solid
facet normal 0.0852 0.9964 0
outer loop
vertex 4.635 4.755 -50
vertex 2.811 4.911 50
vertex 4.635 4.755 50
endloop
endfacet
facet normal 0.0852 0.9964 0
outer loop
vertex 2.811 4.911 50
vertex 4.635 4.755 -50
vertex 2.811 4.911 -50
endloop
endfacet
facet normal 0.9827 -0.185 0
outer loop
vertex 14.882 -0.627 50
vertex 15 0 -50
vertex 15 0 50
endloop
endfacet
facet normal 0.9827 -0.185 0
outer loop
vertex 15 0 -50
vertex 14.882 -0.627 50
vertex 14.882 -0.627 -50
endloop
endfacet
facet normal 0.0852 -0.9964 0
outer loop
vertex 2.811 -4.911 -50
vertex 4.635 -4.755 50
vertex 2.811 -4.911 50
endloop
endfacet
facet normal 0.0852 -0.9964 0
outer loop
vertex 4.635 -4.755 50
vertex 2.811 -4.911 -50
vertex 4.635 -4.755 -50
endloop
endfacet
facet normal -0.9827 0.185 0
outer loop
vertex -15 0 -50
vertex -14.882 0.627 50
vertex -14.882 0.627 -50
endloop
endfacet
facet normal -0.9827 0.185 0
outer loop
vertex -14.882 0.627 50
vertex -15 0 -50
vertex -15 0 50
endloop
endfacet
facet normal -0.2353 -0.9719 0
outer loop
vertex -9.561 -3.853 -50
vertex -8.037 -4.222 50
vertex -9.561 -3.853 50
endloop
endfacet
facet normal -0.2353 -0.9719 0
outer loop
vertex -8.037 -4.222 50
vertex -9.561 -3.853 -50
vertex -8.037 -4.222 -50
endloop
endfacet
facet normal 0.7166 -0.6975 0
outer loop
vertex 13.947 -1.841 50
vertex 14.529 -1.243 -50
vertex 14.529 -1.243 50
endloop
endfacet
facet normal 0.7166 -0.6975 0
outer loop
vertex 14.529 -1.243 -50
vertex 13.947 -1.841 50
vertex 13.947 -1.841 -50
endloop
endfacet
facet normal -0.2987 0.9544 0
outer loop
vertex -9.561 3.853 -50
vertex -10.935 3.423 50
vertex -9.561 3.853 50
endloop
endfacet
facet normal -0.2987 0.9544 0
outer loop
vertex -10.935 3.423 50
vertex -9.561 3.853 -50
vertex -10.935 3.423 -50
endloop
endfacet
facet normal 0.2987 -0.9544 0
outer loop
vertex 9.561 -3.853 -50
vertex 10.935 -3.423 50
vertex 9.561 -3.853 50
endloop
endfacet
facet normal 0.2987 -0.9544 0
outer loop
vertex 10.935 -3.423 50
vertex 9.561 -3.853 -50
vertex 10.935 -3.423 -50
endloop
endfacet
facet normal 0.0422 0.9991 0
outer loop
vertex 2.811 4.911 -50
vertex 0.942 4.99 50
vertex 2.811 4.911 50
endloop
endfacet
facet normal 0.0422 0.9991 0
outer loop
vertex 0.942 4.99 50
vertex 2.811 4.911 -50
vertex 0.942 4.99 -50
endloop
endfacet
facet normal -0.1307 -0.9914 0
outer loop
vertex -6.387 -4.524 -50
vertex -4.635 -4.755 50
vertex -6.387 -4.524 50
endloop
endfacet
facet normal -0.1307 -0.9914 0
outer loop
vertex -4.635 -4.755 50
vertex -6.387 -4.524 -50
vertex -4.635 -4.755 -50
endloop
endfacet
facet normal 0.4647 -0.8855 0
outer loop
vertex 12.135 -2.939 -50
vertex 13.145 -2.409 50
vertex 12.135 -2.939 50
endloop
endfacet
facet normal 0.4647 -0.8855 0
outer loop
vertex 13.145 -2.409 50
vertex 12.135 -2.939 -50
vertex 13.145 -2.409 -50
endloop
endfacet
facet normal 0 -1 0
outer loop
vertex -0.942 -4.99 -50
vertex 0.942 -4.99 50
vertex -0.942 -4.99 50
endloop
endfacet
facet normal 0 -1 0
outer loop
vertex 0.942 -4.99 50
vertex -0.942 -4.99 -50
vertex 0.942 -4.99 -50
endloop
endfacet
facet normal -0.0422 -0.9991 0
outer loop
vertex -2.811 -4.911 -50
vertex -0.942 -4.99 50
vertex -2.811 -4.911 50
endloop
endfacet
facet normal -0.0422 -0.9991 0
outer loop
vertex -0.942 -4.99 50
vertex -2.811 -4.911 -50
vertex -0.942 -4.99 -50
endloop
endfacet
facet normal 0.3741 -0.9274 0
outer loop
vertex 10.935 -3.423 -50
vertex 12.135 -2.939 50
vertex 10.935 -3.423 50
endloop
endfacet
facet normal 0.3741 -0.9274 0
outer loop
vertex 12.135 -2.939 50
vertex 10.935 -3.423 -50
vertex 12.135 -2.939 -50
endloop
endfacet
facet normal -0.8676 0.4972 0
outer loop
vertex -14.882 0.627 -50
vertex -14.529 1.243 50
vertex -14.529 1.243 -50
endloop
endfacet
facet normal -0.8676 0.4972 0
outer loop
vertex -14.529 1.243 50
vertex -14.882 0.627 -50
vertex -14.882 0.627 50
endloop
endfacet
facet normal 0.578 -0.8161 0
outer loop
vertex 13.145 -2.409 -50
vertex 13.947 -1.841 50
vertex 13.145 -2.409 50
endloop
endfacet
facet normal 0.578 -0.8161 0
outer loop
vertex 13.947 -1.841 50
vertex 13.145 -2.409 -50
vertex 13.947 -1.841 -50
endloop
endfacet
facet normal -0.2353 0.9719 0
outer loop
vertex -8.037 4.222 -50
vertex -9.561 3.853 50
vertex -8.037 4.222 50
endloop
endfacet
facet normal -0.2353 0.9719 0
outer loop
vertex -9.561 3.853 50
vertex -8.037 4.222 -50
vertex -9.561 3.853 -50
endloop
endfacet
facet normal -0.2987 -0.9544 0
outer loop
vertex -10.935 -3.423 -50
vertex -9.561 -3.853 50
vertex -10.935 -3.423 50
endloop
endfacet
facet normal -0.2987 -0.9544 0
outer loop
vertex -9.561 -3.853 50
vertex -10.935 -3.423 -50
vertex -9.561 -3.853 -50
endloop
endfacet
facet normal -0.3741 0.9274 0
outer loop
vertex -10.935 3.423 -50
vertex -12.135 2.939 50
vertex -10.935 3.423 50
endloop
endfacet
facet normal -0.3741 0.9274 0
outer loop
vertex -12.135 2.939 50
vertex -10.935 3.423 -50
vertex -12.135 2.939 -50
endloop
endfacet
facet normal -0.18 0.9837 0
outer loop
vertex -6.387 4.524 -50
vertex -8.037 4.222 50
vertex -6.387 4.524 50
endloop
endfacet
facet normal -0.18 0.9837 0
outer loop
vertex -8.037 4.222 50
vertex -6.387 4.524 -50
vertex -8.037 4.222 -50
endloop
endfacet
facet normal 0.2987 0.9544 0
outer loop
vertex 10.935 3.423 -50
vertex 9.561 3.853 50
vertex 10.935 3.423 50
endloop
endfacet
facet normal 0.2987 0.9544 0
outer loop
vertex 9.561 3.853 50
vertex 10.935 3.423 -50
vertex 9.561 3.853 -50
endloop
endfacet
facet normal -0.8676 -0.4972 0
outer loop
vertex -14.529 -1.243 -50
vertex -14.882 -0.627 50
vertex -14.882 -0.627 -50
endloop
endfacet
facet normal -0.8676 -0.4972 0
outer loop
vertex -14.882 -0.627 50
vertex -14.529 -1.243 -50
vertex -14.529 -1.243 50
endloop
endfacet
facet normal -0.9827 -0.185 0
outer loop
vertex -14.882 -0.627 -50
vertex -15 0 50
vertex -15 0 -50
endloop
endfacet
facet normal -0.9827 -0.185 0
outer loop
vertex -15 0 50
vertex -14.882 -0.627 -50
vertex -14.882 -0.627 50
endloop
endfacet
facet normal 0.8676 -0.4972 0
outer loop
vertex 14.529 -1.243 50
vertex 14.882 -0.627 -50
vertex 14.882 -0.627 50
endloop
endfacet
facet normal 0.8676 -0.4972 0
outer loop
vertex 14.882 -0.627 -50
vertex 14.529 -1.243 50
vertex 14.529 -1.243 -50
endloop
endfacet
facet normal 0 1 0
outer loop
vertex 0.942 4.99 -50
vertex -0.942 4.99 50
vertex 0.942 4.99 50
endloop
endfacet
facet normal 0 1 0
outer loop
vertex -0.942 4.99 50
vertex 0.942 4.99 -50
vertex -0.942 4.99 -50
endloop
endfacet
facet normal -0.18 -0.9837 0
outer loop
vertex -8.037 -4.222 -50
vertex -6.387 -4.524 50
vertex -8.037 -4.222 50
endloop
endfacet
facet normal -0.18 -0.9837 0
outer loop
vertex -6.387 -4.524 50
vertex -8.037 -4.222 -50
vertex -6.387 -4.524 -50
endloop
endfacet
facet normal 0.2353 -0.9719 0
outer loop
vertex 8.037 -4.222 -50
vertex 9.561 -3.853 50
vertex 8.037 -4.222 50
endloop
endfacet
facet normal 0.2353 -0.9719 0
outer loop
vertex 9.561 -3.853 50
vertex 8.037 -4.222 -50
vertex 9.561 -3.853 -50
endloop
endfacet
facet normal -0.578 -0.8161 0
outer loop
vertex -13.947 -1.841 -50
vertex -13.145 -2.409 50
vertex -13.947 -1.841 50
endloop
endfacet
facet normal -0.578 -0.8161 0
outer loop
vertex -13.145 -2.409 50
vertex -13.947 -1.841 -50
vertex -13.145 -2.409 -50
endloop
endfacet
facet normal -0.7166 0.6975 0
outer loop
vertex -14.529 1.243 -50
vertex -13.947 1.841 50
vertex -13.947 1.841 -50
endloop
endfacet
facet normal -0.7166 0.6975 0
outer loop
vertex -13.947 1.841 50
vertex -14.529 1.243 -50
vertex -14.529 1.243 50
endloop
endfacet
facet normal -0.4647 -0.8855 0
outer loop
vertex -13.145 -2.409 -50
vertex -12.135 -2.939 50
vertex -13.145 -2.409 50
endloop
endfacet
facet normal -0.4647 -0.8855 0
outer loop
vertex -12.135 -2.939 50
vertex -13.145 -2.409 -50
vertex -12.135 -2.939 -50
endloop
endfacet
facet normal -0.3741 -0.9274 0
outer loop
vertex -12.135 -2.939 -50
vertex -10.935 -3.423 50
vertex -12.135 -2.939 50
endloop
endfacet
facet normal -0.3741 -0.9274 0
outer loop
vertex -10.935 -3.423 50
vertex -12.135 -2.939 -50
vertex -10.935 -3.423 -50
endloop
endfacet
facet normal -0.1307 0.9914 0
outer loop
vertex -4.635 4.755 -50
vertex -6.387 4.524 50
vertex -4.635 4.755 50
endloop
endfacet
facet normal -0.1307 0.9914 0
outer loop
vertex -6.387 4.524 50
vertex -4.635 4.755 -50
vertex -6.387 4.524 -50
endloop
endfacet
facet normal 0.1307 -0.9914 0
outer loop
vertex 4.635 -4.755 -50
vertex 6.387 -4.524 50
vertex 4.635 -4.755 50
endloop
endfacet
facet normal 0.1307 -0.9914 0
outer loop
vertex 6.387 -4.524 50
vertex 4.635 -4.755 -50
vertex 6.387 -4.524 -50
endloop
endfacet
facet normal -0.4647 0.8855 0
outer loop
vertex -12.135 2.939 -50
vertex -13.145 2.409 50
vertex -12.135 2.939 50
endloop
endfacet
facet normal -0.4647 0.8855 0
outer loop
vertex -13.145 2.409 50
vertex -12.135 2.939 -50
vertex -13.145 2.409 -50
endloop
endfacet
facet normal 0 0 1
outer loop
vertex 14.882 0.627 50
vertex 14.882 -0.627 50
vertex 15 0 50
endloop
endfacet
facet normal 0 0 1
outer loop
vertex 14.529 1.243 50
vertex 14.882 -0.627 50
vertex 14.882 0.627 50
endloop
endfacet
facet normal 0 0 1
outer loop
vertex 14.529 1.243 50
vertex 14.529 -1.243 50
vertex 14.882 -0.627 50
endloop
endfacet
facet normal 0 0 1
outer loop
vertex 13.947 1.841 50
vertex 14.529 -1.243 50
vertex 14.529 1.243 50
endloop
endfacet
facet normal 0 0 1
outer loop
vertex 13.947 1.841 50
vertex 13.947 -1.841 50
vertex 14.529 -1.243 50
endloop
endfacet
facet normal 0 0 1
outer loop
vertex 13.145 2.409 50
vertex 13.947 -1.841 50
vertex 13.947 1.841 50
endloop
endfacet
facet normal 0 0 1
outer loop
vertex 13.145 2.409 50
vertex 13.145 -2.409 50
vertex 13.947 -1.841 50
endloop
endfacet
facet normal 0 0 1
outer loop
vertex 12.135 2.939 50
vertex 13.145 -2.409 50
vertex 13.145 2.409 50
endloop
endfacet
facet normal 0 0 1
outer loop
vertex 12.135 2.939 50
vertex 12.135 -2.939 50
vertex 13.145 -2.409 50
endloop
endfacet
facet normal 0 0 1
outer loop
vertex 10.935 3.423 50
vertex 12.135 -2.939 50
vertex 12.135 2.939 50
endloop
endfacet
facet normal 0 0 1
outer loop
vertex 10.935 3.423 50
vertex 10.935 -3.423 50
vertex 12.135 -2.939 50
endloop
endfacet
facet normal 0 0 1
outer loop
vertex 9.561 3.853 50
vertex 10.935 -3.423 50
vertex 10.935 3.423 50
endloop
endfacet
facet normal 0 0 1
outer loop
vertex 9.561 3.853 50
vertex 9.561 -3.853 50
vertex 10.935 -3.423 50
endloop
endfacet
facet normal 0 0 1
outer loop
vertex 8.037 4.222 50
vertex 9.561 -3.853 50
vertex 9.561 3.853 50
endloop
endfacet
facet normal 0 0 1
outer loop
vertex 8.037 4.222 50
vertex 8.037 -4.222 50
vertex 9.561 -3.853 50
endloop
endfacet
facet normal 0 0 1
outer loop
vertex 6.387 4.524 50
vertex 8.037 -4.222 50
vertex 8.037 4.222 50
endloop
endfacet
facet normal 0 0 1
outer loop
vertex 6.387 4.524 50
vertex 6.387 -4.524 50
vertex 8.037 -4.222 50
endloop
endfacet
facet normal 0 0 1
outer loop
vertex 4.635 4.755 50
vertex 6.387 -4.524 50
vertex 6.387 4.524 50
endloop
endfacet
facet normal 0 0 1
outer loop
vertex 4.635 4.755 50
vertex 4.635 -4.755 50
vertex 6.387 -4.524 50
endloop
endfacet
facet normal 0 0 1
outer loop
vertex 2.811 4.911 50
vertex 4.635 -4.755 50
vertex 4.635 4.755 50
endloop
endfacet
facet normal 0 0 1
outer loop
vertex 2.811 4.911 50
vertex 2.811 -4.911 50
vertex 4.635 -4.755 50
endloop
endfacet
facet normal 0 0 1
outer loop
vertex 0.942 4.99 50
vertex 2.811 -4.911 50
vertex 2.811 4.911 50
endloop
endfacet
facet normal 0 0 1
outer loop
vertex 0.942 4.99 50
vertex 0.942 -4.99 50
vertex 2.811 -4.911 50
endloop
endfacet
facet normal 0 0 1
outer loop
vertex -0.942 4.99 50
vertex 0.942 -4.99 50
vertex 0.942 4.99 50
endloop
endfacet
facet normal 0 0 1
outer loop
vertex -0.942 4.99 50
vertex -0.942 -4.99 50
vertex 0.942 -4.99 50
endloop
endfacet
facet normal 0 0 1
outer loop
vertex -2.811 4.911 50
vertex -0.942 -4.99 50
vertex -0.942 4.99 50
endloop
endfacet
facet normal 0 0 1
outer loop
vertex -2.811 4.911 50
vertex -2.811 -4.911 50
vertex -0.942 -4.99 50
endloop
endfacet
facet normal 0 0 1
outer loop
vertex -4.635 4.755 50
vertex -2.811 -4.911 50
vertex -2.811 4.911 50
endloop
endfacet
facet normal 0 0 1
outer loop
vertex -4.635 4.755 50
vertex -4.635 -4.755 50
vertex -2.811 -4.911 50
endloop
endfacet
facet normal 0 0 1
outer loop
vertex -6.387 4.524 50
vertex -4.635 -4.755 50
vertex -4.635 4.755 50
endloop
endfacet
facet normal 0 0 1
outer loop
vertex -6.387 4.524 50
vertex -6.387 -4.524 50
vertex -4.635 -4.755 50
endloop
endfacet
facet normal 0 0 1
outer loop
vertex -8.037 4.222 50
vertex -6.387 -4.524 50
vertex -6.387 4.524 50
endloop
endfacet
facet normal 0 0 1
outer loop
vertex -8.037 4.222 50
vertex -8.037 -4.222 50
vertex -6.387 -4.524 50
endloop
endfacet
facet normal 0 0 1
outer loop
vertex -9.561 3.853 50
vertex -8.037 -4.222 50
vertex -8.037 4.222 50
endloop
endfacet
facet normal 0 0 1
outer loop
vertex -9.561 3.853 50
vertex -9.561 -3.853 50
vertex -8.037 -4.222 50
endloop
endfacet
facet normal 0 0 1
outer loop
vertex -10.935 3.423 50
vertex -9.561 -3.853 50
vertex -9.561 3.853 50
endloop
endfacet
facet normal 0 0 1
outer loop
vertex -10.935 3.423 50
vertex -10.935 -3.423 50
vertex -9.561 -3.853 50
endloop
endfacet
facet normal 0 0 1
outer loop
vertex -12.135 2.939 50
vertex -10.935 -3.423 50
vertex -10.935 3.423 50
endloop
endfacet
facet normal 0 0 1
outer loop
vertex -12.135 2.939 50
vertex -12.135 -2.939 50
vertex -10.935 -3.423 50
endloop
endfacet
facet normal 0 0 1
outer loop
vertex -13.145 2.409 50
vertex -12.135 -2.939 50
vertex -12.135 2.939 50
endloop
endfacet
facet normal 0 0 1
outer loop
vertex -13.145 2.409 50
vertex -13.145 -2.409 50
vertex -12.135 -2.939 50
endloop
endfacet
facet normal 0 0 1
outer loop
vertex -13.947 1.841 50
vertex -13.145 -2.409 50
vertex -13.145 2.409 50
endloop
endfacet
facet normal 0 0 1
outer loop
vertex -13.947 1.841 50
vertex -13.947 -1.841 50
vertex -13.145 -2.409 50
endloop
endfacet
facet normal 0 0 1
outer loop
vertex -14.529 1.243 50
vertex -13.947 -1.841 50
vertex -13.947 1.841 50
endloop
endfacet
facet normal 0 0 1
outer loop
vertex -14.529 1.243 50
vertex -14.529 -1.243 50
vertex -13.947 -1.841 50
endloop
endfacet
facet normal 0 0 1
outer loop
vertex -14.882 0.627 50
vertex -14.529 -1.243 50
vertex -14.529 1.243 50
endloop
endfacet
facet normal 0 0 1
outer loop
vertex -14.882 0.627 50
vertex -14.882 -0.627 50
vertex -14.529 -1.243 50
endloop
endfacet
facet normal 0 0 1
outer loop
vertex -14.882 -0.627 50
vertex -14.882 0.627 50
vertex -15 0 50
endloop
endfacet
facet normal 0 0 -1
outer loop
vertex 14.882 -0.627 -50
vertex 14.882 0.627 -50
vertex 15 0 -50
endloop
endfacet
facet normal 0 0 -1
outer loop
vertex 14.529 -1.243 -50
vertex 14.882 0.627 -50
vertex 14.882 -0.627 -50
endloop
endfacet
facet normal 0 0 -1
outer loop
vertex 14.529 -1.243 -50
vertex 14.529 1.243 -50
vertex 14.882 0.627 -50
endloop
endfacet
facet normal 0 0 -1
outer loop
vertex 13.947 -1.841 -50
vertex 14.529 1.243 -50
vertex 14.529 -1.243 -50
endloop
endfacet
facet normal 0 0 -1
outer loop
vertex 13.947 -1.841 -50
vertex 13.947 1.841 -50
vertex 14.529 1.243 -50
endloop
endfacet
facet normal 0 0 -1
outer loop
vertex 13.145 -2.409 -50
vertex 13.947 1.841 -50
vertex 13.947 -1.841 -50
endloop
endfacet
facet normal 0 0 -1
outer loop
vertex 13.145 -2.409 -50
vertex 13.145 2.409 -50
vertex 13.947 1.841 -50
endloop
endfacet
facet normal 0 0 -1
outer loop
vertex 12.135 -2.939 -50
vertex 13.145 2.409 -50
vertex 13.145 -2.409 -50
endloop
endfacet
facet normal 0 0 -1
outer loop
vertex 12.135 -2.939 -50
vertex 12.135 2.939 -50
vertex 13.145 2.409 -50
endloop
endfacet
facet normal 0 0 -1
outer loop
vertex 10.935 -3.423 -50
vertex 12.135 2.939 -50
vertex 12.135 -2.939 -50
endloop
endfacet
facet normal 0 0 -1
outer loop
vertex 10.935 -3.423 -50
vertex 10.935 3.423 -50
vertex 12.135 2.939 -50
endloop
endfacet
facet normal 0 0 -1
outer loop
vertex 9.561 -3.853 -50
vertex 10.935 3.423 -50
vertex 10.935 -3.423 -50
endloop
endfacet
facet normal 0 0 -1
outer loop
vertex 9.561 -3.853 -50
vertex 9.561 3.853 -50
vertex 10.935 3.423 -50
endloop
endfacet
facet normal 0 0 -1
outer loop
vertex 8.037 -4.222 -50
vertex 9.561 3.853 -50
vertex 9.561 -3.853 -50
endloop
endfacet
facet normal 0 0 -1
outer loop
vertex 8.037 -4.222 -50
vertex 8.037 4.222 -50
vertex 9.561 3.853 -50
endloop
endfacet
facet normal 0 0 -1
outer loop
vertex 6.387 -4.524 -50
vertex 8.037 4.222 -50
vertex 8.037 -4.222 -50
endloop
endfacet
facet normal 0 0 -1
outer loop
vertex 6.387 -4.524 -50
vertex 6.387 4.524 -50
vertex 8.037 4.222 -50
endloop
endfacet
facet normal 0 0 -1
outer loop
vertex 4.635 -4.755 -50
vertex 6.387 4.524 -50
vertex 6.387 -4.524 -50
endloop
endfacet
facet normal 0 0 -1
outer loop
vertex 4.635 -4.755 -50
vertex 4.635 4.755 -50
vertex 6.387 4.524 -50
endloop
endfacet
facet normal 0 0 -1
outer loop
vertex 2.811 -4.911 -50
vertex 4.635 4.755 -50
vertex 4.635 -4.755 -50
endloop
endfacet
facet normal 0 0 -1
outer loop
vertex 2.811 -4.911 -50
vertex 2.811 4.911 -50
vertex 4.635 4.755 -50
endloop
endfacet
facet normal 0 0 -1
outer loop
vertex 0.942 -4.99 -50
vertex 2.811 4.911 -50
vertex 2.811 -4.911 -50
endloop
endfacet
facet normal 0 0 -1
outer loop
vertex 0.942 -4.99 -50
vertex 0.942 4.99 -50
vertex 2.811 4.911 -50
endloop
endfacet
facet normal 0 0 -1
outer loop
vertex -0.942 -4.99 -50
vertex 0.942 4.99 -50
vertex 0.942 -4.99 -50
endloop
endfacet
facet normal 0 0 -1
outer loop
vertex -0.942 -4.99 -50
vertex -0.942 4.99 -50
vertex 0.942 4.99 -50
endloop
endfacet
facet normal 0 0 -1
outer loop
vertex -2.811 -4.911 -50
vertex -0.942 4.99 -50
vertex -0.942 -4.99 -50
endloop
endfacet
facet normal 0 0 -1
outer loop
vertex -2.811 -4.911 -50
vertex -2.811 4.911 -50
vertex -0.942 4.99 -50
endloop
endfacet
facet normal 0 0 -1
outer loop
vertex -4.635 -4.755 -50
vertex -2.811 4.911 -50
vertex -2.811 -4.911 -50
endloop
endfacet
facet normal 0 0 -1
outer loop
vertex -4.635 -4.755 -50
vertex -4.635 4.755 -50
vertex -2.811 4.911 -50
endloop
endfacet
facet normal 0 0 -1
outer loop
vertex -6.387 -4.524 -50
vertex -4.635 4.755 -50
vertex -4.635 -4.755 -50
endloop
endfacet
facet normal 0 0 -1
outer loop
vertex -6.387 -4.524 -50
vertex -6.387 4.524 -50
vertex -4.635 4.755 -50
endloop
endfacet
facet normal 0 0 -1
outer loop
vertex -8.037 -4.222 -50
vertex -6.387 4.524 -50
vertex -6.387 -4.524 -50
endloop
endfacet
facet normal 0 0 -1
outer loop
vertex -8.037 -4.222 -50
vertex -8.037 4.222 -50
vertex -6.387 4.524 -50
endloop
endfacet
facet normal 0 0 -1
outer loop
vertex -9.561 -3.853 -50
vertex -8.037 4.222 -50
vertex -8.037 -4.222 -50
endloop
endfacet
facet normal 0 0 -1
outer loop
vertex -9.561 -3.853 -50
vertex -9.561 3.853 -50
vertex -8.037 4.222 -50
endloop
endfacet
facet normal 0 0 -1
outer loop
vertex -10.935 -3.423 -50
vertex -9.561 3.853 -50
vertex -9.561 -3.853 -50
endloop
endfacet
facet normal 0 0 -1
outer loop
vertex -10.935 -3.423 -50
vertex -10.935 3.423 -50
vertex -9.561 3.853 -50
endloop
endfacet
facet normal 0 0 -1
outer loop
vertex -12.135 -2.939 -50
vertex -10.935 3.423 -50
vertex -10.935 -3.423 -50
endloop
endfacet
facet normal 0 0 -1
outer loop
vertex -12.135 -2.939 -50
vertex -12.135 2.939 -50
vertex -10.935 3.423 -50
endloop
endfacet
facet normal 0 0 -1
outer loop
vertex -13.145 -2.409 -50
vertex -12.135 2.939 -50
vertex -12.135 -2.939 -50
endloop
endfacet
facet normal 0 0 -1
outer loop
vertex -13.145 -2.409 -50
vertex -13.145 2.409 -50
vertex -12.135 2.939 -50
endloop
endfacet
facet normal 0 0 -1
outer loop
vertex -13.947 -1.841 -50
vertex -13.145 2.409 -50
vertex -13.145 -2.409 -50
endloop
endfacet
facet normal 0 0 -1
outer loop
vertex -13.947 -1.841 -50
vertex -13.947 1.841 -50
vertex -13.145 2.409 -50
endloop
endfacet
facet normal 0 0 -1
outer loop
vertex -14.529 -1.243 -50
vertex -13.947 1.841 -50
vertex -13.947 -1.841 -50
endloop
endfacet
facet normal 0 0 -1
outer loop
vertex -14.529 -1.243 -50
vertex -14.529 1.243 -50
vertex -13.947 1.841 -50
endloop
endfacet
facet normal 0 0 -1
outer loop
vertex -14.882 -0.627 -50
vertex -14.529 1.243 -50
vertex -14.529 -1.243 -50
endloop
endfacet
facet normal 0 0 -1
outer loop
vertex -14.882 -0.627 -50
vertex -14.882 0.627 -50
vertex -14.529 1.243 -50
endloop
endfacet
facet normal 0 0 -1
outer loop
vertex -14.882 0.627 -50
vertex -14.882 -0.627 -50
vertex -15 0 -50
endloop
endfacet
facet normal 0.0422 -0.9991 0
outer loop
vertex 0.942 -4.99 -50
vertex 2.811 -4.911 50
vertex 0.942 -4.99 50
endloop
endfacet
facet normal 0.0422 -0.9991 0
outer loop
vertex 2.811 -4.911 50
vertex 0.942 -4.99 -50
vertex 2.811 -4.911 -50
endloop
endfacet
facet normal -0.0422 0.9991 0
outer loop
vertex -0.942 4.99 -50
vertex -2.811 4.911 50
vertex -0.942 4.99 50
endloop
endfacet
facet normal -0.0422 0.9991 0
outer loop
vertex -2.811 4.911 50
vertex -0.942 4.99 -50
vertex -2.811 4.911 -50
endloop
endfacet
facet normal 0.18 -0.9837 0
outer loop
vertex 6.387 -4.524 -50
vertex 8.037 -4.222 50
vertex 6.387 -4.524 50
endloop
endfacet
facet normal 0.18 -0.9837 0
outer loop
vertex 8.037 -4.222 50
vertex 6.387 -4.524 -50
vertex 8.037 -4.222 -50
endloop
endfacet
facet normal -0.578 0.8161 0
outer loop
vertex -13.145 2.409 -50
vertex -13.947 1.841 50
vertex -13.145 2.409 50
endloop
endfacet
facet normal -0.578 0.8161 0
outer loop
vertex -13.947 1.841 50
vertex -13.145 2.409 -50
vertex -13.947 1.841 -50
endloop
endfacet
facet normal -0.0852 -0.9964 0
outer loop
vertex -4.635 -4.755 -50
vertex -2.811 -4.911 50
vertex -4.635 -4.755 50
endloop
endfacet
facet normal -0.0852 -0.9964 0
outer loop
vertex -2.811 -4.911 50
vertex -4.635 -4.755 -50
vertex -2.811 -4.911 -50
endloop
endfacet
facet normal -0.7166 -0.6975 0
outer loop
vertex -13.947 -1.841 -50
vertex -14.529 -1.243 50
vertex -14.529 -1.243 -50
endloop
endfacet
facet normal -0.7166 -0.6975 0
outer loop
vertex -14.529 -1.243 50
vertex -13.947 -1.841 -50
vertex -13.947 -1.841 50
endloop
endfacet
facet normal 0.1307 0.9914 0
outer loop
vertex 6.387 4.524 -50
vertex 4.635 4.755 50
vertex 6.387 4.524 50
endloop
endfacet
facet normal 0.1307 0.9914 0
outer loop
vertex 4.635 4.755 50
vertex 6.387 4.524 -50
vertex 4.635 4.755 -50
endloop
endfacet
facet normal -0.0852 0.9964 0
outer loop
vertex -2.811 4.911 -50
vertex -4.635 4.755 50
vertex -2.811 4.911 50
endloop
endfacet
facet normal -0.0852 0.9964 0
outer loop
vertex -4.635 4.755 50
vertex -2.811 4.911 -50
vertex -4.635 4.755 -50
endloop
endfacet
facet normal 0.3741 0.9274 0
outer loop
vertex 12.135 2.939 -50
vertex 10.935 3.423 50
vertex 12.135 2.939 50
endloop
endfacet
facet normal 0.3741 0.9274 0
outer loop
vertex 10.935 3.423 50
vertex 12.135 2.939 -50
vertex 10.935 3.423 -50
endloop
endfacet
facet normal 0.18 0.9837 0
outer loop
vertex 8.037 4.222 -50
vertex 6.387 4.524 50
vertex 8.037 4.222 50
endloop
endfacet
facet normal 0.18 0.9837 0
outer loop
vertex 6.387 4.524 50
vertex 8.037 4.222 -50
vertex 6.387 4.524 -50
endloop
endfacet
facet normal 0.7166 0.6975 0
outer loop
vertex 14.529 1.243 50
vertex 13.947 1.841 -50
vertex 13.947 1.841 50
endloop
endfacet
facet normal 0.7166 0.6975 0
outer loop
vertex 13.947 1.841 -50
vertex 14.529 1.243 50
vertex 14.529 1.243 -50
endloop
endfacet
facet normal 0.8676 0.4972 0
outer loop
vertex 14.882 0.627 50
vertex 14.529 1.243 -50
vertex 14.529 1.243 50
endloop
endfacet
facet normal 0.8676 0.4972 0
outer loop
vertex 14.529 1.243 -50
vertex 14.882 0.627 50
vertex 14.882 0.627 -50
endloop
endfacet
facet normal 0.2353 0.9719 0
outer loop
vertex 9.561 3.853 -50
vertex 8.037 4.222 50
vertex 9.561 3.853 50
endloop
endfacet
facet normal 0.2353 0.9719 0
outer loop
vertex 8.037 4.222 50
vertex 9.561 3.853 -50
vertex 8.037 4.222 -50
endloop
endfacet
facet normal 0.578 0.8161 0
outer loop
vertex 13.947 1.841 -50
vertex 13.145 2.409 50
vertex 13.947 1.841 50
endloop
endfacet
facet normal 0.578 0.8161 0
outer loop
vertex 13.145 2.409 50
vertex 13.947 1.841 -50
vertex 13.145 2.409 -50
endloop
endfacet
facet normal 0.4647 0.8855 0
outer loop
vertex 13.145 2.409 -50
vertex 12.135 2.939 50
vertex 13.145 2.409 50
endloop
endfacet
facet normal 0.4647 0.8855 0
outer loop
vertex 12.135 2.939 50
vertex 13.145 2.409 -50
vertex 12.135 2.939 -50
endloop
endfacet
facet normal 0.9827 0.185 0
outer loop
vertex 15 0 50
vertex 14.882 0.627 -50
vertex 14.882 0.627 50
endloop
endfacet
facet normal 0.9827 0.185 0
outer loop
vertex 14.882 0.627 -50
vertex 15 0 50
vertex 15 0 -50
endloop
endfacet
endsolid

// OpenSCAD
/*
rotate_extrude($fn = 300)
translate([30,0,0]){
scale([1,2])
circle(d = 10, $fn = 100);
translate([7,0,0])
circle(d = 5 , $fn = 100);
}
*/

/*
linear_extrude(
height=30, 
center =  true,
scale = [1, 1], 
twist = 180, 
slices = 200
)
square([20, 5], center =  true);

*/

linear_extrude(
height = 100, 
center =  true, 
scale = 1 , 
twist = 1080*sin(360*$t), 
slices = 100)
scale([3, 1])
circle(d = 10, $fn = 50);



linear_extrude(
height = 100, 
center =  true, 
scale = 1 , 
twist = -1080*sin(360*$t), 
slices = 100)
scale([3, 1])
circle(d = 10, $fn = 50);
